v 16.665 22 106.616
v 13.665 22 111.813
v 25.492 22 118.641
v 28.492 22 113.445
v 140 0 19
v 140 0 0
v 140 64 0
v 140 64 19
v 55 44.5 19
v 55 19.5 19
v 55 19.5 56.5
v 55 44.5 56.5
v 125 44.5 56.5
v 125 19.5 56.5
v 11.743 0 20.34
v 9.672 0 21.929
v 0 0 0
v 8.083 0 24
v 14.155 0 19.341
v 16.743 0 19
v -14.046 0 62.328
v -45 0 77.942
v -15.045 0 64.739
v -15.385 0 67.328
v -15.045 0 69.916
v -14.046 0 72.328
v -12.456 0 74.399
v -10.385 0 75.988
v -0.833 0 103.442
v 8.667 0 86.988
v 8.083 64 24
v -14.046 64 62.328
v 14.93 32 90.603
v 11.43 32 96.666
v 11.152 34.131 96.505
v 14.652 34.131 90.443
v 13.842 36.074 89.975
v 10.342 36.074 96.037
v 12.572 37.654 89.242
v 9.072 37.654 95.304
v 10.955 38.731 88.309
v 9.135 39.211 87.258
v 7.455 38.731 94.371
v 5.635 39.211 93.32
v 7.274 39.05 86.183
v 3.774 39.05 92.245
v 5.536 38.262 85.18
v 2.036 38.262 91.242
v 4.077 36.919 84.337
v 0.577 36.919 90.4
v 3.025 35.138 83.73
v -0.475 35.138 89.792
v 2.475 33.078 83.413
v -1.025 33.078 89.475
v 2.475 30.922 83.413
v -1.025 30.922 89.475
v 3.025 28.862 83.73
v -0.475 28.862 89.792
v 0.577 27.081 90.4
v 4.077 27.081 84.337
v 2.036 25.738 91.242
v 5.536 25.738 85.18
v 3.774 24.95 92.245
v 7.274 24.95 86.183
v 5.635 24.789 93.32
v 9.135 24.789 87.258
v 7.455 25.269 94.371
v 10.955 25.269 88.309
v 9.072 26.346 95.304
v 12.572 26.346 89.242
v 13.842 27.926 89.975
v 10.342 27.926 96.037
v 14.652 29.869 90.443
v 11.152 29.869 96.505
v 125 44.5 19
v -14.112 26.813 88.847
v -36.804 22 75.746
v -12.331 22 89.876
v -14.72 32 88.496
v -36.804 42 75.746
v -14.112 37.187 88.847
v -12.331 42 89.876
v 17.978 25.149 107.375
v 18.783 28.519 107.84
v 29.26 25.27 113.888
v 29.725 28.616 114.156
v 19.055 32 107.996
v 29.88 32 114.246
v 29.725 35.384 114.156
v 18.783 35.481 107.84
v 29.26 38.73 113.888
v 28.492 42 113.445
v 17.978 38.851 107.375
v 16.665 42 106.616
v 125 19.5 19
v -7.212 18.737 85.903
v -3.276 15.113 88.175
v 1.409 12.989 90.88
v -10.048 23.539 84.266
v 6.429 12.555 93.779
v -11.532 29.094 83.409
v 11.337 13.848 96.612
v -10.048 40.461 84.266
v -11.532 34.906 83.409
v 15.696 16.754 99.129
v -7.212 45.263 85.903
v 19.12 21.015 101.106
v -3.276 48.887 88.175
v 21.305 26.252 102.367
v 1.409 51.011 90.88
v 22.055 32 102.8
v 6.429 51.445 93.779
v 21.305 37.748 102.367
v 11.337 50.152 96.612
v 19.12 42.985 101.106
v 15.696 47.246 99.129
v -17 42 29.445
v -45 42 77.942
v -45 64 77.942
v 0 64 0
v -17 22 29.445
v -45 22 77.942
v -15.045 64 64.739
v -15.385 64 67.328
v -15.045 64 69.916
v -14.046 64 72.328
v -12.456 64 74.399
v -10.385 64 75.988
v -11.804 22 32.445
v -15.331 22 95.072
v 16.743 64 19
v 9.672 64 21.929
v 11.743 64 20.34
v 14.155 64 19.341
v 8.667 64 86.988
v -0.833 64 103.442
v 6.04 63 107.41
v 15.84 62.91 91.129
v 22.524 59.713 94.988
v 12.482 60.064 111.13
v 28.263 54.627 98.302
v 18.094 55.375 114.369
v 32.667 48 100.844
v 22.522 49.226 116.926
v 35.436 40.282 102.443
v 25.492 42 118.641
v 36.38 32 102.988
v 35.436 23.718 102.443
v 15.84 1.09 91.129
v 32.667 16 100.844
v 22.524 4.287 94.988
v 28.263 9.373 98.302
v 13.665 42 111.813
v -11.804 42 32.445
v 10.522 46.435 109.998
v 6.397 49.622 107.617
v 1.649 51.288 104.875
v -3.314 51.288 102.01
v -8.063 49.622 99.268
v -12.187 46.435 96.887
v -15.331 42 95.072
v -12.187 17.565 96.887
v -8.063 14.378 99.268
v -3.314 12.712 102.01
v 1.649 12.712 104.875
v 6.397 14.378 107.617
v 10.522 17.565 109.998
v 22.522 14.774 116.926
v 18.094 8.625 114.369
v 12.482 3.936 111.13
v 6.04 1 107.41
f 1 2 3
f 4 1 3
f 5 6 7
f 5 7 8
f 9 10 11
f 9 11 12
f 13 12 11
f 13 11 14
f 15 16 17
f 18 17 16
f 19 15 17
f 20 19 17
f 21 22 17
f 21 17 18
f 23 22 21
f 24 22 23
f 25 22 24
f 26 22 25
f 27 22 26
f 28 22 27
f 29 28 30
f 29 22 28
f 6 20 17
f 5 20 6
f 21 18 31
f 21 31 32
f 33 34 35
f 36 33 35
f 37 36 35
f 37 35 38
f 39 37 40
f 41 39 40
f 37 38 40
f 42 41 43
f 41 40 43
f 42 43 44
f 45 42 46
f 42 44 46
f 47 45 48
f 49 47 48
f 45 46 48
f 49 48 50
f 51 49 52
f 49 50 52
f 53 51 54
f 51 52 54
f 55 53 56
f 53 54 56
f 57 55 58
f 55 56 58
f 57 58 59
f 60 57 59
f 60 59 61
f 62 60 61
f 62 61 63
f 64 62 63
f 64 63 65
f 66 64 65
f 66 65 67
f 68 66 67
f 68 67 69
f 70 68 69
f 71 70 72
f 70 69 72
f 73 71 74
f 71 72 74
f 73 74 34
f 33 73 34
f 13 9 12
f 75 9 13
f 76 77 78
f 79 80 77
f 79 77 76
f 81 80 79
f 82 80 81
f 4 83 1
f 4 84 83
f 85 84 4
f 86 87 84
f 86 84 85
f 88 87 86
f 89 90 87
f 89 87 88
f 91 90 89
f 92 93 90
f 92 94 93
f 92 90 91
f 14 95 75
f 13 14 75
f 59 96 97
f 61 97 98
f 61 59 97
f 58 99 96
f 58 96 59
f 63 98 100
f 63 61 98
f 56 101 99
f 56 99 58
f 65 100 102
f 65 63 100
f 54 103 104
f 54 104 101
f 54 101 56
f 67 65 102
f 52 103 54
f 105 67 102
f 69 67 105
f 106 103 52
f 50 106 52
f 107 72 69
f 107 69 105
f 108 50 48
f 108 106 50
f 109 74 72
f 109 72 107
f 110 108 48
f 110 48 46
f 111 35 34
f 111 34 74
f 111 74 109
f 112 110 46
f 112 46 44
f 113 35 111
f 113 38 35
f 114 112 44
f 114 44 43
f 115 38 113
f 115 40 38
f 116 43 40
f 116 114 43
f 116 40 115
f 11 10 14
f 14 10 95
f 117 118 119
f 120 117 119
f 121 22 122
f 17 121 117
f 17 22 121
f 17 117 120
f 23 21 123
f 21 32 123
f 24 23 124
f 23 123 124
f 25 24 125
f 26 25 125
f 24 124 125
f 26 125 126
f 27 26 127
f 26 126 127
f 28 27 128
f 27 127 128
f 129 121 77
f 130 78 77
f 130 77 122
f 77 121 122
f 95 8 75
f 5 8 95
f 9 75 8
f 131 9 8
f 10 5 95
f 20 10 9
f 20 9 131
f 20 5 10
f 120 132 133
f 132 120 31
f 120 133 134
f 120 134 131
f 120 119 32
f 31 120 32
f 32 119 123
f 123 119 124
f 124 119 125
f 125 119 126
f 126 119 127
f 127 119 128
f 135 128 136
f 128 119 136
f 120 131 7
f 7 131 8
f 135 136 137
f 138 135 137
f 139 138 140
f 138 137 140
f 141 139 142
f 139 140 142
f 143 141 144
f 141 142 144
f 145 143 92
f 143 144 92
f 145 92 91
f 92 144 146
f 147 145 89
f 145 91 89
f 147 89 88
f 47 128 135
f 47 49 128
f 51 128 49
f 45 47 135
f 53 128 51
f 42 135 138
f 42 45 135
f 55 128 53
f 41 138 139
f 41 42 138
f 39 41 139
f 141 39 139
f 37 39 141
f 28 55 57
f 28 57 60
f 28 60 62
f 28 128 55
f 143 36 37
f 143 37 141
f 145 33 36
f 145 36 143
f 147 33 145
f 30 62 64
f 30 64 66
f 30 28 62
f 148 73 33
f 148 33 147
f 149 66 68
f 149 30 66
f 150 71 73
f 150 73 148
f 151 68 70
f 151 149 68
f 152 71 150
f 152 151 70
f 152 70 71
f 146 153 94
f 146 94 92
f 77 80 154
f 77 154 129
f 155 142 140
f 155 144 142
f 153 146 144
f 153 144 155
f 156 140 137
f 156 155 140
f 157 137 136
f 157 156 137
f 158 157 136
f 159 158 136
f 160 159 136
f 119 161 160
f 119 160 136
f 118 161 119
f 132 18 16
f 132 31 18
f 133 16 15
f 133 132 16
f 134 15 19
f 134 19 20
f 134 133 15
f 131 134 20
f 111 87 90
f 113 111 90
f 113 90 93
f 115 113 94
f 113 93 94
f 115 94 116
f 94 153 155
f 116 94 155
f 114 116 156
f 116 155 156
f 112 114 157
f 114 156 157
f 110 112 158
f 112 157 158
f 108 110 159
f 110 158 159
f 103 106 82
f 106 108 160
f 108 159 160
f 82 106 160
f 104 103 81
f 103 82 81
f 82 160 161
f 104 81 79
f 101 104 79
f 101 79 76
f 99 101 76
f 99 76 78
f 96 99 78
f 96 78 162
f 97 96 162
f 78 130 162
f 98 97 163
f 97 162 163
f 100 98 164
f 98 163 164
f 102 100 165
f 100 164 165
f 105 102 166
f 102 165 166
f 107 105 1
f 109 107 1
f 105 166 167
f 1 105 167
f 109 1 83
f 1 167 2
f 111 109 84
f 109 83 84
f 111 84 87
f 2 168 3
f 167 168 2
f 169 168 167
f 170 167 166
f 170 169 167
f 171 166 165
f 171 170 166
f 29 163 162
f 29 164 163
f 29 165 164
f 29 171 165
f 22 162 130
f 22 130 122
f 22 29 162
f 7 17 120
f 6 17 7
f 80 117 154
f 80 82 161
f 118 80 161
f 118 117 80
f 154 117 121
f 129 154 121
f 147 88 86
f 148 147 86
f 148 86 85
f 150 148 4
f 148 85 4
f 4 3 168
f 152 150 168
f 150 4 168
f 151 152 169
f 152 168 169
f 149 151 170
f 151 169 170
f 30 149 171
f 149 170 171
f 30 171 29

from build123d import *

# Parameters (mm, degrees)
F1_DEPTH  = 64
F3_DEPTH  = 25
F4_R      = 19.5
F4_R_2    = 6
F5_DEPTH  = 12
F6_R      = 7.2312800618
F7_DEPTH  = 7
F8_W      = 20
F8_H      = 56
F9_DEPTH  = 6
F10_W     = 88.7789055705
F10_H     = 20
F11_DEPTH = 6
F12_R     = 10
F13_R     = 10
F14_W     = 70
F14_H     = 25
F15_DEPTH = 37.5


with BuildPart() as f1:
    # F0 (on Front) → F1 (new body)
    with BuildSketch(Plane.XZ):
        Polygon((-45, 77.9422863406), (0, 0), (140, 0), (140, 19), (10.9696551146, 19), (-19.0455173281, 70.9878036687), (36.3801085141, 102.9878036687), (26.8801085141, 119.4422863406), align=None)
    extrude(amount=-F1_DEPTH)

    # F2 (on face) → F3 (cut)
    with BuildSketch(Plane(origin=(-45, 0, 77.9422863406), x_dir=(0.8660254038, 0, 0.5), z_dir=(-0.5, 0, 0.8660254038))):
        with BuildLine():
            ThreePointArc((51, 64), (73.627416998, 54.627416998), (83, 32))
            Line((83, 32), (83, 64))
            Line((83, 64), (51, 64))
        make_face()
        with BuildLine():
            Line((83, 0), (83, 32))
            ThreePointArc((83, 32), (73.627416998, 9.372583002), (51, 0))
            Line((51, 0), (83, 0))
        make_face()
    extrude(amount=-F3_DEPTH, mode=Mode.SUBTRACT)

    # F4 (on face) → F5 (cut)
    with BuildSketch(Plane(origin=(-45, 0, 77.9422863406), x_dir=(0.8660254038, 0, 0.5), z_dir=(-0.5, 0, 0.8660254038))):
        with Locations((51, 32)):
            Circle(F4_R)
        with Locations((51, 32)):
            Circle(F4_R_2, mode=Mode.SUBTRACT)
        with Locations((51, 32)):
            Circle(F4_R_2)
    extrude(amount=-F5_DEPTH, mode=Mode.SUBTRACT)

    # F6 (on face) → F7 (cut, through all)
    with BuildSketch(Plane(origin=(-39, 0, 67.5499814952), x_dir=(0.8660254038, 0, 0.5), z_dir=(-0.5, 0, 0.8660254038))):
        with Locations((51, 32)):
            Circle(F6_R)
    extrude(amount=-F7_DEPTH, mode=Mode.SUBTRACT)

    # F8 (on face) → F9 (cut)
    with BuildSketch(Plane(origin=(0, 0, 0), x_dir=(0, -1, 0), z_dir=(-0.8660254038, 0, -0.5))):
        with Locations((-32, 62)):
            Rectangle(F8_W, F8_H)
    extrude(amount=-F9_DEPTH, mode=Mode.SUBTRACT)

    # F10 (on face) → F11 (cut)
    with BuildSketch(Plane(origin=(-45, 0, 77.9422863406), x_dir=(0.8660254038, 0, 0.5), z_dir=(-0.5, 0, 0.8660254038))):
        with Locations((44.3894527853, 32)):
            Rectangle(F10_W, F10_H)
    extrude(amount=-F11_DEPTH, mode=Mode.SUBTRACT)

    # F12
    f12_edges = [f1.edges().sort_by_distance(p)[0] for p in [
        (-19.045517, 32, 70.987804),
    ]]
    fillet(f12_edges, radius=F12_R)

    # F13
    f13_edges = [f1.edges().sort_by_distance(p)[0] for p in [
        (10.969655, 32, 19),
    ]]
    fillet(f13_edges, radius=F13_R)

    # F14 (on face) → F15 (join)
    with BuildSketch(Plane.XY.offset(19)):
        with Locations((90, 32)):
            Rectangle(F14_W, F14_H)
    extrude(amount=F15_DEPTH)


solid = f1.part
